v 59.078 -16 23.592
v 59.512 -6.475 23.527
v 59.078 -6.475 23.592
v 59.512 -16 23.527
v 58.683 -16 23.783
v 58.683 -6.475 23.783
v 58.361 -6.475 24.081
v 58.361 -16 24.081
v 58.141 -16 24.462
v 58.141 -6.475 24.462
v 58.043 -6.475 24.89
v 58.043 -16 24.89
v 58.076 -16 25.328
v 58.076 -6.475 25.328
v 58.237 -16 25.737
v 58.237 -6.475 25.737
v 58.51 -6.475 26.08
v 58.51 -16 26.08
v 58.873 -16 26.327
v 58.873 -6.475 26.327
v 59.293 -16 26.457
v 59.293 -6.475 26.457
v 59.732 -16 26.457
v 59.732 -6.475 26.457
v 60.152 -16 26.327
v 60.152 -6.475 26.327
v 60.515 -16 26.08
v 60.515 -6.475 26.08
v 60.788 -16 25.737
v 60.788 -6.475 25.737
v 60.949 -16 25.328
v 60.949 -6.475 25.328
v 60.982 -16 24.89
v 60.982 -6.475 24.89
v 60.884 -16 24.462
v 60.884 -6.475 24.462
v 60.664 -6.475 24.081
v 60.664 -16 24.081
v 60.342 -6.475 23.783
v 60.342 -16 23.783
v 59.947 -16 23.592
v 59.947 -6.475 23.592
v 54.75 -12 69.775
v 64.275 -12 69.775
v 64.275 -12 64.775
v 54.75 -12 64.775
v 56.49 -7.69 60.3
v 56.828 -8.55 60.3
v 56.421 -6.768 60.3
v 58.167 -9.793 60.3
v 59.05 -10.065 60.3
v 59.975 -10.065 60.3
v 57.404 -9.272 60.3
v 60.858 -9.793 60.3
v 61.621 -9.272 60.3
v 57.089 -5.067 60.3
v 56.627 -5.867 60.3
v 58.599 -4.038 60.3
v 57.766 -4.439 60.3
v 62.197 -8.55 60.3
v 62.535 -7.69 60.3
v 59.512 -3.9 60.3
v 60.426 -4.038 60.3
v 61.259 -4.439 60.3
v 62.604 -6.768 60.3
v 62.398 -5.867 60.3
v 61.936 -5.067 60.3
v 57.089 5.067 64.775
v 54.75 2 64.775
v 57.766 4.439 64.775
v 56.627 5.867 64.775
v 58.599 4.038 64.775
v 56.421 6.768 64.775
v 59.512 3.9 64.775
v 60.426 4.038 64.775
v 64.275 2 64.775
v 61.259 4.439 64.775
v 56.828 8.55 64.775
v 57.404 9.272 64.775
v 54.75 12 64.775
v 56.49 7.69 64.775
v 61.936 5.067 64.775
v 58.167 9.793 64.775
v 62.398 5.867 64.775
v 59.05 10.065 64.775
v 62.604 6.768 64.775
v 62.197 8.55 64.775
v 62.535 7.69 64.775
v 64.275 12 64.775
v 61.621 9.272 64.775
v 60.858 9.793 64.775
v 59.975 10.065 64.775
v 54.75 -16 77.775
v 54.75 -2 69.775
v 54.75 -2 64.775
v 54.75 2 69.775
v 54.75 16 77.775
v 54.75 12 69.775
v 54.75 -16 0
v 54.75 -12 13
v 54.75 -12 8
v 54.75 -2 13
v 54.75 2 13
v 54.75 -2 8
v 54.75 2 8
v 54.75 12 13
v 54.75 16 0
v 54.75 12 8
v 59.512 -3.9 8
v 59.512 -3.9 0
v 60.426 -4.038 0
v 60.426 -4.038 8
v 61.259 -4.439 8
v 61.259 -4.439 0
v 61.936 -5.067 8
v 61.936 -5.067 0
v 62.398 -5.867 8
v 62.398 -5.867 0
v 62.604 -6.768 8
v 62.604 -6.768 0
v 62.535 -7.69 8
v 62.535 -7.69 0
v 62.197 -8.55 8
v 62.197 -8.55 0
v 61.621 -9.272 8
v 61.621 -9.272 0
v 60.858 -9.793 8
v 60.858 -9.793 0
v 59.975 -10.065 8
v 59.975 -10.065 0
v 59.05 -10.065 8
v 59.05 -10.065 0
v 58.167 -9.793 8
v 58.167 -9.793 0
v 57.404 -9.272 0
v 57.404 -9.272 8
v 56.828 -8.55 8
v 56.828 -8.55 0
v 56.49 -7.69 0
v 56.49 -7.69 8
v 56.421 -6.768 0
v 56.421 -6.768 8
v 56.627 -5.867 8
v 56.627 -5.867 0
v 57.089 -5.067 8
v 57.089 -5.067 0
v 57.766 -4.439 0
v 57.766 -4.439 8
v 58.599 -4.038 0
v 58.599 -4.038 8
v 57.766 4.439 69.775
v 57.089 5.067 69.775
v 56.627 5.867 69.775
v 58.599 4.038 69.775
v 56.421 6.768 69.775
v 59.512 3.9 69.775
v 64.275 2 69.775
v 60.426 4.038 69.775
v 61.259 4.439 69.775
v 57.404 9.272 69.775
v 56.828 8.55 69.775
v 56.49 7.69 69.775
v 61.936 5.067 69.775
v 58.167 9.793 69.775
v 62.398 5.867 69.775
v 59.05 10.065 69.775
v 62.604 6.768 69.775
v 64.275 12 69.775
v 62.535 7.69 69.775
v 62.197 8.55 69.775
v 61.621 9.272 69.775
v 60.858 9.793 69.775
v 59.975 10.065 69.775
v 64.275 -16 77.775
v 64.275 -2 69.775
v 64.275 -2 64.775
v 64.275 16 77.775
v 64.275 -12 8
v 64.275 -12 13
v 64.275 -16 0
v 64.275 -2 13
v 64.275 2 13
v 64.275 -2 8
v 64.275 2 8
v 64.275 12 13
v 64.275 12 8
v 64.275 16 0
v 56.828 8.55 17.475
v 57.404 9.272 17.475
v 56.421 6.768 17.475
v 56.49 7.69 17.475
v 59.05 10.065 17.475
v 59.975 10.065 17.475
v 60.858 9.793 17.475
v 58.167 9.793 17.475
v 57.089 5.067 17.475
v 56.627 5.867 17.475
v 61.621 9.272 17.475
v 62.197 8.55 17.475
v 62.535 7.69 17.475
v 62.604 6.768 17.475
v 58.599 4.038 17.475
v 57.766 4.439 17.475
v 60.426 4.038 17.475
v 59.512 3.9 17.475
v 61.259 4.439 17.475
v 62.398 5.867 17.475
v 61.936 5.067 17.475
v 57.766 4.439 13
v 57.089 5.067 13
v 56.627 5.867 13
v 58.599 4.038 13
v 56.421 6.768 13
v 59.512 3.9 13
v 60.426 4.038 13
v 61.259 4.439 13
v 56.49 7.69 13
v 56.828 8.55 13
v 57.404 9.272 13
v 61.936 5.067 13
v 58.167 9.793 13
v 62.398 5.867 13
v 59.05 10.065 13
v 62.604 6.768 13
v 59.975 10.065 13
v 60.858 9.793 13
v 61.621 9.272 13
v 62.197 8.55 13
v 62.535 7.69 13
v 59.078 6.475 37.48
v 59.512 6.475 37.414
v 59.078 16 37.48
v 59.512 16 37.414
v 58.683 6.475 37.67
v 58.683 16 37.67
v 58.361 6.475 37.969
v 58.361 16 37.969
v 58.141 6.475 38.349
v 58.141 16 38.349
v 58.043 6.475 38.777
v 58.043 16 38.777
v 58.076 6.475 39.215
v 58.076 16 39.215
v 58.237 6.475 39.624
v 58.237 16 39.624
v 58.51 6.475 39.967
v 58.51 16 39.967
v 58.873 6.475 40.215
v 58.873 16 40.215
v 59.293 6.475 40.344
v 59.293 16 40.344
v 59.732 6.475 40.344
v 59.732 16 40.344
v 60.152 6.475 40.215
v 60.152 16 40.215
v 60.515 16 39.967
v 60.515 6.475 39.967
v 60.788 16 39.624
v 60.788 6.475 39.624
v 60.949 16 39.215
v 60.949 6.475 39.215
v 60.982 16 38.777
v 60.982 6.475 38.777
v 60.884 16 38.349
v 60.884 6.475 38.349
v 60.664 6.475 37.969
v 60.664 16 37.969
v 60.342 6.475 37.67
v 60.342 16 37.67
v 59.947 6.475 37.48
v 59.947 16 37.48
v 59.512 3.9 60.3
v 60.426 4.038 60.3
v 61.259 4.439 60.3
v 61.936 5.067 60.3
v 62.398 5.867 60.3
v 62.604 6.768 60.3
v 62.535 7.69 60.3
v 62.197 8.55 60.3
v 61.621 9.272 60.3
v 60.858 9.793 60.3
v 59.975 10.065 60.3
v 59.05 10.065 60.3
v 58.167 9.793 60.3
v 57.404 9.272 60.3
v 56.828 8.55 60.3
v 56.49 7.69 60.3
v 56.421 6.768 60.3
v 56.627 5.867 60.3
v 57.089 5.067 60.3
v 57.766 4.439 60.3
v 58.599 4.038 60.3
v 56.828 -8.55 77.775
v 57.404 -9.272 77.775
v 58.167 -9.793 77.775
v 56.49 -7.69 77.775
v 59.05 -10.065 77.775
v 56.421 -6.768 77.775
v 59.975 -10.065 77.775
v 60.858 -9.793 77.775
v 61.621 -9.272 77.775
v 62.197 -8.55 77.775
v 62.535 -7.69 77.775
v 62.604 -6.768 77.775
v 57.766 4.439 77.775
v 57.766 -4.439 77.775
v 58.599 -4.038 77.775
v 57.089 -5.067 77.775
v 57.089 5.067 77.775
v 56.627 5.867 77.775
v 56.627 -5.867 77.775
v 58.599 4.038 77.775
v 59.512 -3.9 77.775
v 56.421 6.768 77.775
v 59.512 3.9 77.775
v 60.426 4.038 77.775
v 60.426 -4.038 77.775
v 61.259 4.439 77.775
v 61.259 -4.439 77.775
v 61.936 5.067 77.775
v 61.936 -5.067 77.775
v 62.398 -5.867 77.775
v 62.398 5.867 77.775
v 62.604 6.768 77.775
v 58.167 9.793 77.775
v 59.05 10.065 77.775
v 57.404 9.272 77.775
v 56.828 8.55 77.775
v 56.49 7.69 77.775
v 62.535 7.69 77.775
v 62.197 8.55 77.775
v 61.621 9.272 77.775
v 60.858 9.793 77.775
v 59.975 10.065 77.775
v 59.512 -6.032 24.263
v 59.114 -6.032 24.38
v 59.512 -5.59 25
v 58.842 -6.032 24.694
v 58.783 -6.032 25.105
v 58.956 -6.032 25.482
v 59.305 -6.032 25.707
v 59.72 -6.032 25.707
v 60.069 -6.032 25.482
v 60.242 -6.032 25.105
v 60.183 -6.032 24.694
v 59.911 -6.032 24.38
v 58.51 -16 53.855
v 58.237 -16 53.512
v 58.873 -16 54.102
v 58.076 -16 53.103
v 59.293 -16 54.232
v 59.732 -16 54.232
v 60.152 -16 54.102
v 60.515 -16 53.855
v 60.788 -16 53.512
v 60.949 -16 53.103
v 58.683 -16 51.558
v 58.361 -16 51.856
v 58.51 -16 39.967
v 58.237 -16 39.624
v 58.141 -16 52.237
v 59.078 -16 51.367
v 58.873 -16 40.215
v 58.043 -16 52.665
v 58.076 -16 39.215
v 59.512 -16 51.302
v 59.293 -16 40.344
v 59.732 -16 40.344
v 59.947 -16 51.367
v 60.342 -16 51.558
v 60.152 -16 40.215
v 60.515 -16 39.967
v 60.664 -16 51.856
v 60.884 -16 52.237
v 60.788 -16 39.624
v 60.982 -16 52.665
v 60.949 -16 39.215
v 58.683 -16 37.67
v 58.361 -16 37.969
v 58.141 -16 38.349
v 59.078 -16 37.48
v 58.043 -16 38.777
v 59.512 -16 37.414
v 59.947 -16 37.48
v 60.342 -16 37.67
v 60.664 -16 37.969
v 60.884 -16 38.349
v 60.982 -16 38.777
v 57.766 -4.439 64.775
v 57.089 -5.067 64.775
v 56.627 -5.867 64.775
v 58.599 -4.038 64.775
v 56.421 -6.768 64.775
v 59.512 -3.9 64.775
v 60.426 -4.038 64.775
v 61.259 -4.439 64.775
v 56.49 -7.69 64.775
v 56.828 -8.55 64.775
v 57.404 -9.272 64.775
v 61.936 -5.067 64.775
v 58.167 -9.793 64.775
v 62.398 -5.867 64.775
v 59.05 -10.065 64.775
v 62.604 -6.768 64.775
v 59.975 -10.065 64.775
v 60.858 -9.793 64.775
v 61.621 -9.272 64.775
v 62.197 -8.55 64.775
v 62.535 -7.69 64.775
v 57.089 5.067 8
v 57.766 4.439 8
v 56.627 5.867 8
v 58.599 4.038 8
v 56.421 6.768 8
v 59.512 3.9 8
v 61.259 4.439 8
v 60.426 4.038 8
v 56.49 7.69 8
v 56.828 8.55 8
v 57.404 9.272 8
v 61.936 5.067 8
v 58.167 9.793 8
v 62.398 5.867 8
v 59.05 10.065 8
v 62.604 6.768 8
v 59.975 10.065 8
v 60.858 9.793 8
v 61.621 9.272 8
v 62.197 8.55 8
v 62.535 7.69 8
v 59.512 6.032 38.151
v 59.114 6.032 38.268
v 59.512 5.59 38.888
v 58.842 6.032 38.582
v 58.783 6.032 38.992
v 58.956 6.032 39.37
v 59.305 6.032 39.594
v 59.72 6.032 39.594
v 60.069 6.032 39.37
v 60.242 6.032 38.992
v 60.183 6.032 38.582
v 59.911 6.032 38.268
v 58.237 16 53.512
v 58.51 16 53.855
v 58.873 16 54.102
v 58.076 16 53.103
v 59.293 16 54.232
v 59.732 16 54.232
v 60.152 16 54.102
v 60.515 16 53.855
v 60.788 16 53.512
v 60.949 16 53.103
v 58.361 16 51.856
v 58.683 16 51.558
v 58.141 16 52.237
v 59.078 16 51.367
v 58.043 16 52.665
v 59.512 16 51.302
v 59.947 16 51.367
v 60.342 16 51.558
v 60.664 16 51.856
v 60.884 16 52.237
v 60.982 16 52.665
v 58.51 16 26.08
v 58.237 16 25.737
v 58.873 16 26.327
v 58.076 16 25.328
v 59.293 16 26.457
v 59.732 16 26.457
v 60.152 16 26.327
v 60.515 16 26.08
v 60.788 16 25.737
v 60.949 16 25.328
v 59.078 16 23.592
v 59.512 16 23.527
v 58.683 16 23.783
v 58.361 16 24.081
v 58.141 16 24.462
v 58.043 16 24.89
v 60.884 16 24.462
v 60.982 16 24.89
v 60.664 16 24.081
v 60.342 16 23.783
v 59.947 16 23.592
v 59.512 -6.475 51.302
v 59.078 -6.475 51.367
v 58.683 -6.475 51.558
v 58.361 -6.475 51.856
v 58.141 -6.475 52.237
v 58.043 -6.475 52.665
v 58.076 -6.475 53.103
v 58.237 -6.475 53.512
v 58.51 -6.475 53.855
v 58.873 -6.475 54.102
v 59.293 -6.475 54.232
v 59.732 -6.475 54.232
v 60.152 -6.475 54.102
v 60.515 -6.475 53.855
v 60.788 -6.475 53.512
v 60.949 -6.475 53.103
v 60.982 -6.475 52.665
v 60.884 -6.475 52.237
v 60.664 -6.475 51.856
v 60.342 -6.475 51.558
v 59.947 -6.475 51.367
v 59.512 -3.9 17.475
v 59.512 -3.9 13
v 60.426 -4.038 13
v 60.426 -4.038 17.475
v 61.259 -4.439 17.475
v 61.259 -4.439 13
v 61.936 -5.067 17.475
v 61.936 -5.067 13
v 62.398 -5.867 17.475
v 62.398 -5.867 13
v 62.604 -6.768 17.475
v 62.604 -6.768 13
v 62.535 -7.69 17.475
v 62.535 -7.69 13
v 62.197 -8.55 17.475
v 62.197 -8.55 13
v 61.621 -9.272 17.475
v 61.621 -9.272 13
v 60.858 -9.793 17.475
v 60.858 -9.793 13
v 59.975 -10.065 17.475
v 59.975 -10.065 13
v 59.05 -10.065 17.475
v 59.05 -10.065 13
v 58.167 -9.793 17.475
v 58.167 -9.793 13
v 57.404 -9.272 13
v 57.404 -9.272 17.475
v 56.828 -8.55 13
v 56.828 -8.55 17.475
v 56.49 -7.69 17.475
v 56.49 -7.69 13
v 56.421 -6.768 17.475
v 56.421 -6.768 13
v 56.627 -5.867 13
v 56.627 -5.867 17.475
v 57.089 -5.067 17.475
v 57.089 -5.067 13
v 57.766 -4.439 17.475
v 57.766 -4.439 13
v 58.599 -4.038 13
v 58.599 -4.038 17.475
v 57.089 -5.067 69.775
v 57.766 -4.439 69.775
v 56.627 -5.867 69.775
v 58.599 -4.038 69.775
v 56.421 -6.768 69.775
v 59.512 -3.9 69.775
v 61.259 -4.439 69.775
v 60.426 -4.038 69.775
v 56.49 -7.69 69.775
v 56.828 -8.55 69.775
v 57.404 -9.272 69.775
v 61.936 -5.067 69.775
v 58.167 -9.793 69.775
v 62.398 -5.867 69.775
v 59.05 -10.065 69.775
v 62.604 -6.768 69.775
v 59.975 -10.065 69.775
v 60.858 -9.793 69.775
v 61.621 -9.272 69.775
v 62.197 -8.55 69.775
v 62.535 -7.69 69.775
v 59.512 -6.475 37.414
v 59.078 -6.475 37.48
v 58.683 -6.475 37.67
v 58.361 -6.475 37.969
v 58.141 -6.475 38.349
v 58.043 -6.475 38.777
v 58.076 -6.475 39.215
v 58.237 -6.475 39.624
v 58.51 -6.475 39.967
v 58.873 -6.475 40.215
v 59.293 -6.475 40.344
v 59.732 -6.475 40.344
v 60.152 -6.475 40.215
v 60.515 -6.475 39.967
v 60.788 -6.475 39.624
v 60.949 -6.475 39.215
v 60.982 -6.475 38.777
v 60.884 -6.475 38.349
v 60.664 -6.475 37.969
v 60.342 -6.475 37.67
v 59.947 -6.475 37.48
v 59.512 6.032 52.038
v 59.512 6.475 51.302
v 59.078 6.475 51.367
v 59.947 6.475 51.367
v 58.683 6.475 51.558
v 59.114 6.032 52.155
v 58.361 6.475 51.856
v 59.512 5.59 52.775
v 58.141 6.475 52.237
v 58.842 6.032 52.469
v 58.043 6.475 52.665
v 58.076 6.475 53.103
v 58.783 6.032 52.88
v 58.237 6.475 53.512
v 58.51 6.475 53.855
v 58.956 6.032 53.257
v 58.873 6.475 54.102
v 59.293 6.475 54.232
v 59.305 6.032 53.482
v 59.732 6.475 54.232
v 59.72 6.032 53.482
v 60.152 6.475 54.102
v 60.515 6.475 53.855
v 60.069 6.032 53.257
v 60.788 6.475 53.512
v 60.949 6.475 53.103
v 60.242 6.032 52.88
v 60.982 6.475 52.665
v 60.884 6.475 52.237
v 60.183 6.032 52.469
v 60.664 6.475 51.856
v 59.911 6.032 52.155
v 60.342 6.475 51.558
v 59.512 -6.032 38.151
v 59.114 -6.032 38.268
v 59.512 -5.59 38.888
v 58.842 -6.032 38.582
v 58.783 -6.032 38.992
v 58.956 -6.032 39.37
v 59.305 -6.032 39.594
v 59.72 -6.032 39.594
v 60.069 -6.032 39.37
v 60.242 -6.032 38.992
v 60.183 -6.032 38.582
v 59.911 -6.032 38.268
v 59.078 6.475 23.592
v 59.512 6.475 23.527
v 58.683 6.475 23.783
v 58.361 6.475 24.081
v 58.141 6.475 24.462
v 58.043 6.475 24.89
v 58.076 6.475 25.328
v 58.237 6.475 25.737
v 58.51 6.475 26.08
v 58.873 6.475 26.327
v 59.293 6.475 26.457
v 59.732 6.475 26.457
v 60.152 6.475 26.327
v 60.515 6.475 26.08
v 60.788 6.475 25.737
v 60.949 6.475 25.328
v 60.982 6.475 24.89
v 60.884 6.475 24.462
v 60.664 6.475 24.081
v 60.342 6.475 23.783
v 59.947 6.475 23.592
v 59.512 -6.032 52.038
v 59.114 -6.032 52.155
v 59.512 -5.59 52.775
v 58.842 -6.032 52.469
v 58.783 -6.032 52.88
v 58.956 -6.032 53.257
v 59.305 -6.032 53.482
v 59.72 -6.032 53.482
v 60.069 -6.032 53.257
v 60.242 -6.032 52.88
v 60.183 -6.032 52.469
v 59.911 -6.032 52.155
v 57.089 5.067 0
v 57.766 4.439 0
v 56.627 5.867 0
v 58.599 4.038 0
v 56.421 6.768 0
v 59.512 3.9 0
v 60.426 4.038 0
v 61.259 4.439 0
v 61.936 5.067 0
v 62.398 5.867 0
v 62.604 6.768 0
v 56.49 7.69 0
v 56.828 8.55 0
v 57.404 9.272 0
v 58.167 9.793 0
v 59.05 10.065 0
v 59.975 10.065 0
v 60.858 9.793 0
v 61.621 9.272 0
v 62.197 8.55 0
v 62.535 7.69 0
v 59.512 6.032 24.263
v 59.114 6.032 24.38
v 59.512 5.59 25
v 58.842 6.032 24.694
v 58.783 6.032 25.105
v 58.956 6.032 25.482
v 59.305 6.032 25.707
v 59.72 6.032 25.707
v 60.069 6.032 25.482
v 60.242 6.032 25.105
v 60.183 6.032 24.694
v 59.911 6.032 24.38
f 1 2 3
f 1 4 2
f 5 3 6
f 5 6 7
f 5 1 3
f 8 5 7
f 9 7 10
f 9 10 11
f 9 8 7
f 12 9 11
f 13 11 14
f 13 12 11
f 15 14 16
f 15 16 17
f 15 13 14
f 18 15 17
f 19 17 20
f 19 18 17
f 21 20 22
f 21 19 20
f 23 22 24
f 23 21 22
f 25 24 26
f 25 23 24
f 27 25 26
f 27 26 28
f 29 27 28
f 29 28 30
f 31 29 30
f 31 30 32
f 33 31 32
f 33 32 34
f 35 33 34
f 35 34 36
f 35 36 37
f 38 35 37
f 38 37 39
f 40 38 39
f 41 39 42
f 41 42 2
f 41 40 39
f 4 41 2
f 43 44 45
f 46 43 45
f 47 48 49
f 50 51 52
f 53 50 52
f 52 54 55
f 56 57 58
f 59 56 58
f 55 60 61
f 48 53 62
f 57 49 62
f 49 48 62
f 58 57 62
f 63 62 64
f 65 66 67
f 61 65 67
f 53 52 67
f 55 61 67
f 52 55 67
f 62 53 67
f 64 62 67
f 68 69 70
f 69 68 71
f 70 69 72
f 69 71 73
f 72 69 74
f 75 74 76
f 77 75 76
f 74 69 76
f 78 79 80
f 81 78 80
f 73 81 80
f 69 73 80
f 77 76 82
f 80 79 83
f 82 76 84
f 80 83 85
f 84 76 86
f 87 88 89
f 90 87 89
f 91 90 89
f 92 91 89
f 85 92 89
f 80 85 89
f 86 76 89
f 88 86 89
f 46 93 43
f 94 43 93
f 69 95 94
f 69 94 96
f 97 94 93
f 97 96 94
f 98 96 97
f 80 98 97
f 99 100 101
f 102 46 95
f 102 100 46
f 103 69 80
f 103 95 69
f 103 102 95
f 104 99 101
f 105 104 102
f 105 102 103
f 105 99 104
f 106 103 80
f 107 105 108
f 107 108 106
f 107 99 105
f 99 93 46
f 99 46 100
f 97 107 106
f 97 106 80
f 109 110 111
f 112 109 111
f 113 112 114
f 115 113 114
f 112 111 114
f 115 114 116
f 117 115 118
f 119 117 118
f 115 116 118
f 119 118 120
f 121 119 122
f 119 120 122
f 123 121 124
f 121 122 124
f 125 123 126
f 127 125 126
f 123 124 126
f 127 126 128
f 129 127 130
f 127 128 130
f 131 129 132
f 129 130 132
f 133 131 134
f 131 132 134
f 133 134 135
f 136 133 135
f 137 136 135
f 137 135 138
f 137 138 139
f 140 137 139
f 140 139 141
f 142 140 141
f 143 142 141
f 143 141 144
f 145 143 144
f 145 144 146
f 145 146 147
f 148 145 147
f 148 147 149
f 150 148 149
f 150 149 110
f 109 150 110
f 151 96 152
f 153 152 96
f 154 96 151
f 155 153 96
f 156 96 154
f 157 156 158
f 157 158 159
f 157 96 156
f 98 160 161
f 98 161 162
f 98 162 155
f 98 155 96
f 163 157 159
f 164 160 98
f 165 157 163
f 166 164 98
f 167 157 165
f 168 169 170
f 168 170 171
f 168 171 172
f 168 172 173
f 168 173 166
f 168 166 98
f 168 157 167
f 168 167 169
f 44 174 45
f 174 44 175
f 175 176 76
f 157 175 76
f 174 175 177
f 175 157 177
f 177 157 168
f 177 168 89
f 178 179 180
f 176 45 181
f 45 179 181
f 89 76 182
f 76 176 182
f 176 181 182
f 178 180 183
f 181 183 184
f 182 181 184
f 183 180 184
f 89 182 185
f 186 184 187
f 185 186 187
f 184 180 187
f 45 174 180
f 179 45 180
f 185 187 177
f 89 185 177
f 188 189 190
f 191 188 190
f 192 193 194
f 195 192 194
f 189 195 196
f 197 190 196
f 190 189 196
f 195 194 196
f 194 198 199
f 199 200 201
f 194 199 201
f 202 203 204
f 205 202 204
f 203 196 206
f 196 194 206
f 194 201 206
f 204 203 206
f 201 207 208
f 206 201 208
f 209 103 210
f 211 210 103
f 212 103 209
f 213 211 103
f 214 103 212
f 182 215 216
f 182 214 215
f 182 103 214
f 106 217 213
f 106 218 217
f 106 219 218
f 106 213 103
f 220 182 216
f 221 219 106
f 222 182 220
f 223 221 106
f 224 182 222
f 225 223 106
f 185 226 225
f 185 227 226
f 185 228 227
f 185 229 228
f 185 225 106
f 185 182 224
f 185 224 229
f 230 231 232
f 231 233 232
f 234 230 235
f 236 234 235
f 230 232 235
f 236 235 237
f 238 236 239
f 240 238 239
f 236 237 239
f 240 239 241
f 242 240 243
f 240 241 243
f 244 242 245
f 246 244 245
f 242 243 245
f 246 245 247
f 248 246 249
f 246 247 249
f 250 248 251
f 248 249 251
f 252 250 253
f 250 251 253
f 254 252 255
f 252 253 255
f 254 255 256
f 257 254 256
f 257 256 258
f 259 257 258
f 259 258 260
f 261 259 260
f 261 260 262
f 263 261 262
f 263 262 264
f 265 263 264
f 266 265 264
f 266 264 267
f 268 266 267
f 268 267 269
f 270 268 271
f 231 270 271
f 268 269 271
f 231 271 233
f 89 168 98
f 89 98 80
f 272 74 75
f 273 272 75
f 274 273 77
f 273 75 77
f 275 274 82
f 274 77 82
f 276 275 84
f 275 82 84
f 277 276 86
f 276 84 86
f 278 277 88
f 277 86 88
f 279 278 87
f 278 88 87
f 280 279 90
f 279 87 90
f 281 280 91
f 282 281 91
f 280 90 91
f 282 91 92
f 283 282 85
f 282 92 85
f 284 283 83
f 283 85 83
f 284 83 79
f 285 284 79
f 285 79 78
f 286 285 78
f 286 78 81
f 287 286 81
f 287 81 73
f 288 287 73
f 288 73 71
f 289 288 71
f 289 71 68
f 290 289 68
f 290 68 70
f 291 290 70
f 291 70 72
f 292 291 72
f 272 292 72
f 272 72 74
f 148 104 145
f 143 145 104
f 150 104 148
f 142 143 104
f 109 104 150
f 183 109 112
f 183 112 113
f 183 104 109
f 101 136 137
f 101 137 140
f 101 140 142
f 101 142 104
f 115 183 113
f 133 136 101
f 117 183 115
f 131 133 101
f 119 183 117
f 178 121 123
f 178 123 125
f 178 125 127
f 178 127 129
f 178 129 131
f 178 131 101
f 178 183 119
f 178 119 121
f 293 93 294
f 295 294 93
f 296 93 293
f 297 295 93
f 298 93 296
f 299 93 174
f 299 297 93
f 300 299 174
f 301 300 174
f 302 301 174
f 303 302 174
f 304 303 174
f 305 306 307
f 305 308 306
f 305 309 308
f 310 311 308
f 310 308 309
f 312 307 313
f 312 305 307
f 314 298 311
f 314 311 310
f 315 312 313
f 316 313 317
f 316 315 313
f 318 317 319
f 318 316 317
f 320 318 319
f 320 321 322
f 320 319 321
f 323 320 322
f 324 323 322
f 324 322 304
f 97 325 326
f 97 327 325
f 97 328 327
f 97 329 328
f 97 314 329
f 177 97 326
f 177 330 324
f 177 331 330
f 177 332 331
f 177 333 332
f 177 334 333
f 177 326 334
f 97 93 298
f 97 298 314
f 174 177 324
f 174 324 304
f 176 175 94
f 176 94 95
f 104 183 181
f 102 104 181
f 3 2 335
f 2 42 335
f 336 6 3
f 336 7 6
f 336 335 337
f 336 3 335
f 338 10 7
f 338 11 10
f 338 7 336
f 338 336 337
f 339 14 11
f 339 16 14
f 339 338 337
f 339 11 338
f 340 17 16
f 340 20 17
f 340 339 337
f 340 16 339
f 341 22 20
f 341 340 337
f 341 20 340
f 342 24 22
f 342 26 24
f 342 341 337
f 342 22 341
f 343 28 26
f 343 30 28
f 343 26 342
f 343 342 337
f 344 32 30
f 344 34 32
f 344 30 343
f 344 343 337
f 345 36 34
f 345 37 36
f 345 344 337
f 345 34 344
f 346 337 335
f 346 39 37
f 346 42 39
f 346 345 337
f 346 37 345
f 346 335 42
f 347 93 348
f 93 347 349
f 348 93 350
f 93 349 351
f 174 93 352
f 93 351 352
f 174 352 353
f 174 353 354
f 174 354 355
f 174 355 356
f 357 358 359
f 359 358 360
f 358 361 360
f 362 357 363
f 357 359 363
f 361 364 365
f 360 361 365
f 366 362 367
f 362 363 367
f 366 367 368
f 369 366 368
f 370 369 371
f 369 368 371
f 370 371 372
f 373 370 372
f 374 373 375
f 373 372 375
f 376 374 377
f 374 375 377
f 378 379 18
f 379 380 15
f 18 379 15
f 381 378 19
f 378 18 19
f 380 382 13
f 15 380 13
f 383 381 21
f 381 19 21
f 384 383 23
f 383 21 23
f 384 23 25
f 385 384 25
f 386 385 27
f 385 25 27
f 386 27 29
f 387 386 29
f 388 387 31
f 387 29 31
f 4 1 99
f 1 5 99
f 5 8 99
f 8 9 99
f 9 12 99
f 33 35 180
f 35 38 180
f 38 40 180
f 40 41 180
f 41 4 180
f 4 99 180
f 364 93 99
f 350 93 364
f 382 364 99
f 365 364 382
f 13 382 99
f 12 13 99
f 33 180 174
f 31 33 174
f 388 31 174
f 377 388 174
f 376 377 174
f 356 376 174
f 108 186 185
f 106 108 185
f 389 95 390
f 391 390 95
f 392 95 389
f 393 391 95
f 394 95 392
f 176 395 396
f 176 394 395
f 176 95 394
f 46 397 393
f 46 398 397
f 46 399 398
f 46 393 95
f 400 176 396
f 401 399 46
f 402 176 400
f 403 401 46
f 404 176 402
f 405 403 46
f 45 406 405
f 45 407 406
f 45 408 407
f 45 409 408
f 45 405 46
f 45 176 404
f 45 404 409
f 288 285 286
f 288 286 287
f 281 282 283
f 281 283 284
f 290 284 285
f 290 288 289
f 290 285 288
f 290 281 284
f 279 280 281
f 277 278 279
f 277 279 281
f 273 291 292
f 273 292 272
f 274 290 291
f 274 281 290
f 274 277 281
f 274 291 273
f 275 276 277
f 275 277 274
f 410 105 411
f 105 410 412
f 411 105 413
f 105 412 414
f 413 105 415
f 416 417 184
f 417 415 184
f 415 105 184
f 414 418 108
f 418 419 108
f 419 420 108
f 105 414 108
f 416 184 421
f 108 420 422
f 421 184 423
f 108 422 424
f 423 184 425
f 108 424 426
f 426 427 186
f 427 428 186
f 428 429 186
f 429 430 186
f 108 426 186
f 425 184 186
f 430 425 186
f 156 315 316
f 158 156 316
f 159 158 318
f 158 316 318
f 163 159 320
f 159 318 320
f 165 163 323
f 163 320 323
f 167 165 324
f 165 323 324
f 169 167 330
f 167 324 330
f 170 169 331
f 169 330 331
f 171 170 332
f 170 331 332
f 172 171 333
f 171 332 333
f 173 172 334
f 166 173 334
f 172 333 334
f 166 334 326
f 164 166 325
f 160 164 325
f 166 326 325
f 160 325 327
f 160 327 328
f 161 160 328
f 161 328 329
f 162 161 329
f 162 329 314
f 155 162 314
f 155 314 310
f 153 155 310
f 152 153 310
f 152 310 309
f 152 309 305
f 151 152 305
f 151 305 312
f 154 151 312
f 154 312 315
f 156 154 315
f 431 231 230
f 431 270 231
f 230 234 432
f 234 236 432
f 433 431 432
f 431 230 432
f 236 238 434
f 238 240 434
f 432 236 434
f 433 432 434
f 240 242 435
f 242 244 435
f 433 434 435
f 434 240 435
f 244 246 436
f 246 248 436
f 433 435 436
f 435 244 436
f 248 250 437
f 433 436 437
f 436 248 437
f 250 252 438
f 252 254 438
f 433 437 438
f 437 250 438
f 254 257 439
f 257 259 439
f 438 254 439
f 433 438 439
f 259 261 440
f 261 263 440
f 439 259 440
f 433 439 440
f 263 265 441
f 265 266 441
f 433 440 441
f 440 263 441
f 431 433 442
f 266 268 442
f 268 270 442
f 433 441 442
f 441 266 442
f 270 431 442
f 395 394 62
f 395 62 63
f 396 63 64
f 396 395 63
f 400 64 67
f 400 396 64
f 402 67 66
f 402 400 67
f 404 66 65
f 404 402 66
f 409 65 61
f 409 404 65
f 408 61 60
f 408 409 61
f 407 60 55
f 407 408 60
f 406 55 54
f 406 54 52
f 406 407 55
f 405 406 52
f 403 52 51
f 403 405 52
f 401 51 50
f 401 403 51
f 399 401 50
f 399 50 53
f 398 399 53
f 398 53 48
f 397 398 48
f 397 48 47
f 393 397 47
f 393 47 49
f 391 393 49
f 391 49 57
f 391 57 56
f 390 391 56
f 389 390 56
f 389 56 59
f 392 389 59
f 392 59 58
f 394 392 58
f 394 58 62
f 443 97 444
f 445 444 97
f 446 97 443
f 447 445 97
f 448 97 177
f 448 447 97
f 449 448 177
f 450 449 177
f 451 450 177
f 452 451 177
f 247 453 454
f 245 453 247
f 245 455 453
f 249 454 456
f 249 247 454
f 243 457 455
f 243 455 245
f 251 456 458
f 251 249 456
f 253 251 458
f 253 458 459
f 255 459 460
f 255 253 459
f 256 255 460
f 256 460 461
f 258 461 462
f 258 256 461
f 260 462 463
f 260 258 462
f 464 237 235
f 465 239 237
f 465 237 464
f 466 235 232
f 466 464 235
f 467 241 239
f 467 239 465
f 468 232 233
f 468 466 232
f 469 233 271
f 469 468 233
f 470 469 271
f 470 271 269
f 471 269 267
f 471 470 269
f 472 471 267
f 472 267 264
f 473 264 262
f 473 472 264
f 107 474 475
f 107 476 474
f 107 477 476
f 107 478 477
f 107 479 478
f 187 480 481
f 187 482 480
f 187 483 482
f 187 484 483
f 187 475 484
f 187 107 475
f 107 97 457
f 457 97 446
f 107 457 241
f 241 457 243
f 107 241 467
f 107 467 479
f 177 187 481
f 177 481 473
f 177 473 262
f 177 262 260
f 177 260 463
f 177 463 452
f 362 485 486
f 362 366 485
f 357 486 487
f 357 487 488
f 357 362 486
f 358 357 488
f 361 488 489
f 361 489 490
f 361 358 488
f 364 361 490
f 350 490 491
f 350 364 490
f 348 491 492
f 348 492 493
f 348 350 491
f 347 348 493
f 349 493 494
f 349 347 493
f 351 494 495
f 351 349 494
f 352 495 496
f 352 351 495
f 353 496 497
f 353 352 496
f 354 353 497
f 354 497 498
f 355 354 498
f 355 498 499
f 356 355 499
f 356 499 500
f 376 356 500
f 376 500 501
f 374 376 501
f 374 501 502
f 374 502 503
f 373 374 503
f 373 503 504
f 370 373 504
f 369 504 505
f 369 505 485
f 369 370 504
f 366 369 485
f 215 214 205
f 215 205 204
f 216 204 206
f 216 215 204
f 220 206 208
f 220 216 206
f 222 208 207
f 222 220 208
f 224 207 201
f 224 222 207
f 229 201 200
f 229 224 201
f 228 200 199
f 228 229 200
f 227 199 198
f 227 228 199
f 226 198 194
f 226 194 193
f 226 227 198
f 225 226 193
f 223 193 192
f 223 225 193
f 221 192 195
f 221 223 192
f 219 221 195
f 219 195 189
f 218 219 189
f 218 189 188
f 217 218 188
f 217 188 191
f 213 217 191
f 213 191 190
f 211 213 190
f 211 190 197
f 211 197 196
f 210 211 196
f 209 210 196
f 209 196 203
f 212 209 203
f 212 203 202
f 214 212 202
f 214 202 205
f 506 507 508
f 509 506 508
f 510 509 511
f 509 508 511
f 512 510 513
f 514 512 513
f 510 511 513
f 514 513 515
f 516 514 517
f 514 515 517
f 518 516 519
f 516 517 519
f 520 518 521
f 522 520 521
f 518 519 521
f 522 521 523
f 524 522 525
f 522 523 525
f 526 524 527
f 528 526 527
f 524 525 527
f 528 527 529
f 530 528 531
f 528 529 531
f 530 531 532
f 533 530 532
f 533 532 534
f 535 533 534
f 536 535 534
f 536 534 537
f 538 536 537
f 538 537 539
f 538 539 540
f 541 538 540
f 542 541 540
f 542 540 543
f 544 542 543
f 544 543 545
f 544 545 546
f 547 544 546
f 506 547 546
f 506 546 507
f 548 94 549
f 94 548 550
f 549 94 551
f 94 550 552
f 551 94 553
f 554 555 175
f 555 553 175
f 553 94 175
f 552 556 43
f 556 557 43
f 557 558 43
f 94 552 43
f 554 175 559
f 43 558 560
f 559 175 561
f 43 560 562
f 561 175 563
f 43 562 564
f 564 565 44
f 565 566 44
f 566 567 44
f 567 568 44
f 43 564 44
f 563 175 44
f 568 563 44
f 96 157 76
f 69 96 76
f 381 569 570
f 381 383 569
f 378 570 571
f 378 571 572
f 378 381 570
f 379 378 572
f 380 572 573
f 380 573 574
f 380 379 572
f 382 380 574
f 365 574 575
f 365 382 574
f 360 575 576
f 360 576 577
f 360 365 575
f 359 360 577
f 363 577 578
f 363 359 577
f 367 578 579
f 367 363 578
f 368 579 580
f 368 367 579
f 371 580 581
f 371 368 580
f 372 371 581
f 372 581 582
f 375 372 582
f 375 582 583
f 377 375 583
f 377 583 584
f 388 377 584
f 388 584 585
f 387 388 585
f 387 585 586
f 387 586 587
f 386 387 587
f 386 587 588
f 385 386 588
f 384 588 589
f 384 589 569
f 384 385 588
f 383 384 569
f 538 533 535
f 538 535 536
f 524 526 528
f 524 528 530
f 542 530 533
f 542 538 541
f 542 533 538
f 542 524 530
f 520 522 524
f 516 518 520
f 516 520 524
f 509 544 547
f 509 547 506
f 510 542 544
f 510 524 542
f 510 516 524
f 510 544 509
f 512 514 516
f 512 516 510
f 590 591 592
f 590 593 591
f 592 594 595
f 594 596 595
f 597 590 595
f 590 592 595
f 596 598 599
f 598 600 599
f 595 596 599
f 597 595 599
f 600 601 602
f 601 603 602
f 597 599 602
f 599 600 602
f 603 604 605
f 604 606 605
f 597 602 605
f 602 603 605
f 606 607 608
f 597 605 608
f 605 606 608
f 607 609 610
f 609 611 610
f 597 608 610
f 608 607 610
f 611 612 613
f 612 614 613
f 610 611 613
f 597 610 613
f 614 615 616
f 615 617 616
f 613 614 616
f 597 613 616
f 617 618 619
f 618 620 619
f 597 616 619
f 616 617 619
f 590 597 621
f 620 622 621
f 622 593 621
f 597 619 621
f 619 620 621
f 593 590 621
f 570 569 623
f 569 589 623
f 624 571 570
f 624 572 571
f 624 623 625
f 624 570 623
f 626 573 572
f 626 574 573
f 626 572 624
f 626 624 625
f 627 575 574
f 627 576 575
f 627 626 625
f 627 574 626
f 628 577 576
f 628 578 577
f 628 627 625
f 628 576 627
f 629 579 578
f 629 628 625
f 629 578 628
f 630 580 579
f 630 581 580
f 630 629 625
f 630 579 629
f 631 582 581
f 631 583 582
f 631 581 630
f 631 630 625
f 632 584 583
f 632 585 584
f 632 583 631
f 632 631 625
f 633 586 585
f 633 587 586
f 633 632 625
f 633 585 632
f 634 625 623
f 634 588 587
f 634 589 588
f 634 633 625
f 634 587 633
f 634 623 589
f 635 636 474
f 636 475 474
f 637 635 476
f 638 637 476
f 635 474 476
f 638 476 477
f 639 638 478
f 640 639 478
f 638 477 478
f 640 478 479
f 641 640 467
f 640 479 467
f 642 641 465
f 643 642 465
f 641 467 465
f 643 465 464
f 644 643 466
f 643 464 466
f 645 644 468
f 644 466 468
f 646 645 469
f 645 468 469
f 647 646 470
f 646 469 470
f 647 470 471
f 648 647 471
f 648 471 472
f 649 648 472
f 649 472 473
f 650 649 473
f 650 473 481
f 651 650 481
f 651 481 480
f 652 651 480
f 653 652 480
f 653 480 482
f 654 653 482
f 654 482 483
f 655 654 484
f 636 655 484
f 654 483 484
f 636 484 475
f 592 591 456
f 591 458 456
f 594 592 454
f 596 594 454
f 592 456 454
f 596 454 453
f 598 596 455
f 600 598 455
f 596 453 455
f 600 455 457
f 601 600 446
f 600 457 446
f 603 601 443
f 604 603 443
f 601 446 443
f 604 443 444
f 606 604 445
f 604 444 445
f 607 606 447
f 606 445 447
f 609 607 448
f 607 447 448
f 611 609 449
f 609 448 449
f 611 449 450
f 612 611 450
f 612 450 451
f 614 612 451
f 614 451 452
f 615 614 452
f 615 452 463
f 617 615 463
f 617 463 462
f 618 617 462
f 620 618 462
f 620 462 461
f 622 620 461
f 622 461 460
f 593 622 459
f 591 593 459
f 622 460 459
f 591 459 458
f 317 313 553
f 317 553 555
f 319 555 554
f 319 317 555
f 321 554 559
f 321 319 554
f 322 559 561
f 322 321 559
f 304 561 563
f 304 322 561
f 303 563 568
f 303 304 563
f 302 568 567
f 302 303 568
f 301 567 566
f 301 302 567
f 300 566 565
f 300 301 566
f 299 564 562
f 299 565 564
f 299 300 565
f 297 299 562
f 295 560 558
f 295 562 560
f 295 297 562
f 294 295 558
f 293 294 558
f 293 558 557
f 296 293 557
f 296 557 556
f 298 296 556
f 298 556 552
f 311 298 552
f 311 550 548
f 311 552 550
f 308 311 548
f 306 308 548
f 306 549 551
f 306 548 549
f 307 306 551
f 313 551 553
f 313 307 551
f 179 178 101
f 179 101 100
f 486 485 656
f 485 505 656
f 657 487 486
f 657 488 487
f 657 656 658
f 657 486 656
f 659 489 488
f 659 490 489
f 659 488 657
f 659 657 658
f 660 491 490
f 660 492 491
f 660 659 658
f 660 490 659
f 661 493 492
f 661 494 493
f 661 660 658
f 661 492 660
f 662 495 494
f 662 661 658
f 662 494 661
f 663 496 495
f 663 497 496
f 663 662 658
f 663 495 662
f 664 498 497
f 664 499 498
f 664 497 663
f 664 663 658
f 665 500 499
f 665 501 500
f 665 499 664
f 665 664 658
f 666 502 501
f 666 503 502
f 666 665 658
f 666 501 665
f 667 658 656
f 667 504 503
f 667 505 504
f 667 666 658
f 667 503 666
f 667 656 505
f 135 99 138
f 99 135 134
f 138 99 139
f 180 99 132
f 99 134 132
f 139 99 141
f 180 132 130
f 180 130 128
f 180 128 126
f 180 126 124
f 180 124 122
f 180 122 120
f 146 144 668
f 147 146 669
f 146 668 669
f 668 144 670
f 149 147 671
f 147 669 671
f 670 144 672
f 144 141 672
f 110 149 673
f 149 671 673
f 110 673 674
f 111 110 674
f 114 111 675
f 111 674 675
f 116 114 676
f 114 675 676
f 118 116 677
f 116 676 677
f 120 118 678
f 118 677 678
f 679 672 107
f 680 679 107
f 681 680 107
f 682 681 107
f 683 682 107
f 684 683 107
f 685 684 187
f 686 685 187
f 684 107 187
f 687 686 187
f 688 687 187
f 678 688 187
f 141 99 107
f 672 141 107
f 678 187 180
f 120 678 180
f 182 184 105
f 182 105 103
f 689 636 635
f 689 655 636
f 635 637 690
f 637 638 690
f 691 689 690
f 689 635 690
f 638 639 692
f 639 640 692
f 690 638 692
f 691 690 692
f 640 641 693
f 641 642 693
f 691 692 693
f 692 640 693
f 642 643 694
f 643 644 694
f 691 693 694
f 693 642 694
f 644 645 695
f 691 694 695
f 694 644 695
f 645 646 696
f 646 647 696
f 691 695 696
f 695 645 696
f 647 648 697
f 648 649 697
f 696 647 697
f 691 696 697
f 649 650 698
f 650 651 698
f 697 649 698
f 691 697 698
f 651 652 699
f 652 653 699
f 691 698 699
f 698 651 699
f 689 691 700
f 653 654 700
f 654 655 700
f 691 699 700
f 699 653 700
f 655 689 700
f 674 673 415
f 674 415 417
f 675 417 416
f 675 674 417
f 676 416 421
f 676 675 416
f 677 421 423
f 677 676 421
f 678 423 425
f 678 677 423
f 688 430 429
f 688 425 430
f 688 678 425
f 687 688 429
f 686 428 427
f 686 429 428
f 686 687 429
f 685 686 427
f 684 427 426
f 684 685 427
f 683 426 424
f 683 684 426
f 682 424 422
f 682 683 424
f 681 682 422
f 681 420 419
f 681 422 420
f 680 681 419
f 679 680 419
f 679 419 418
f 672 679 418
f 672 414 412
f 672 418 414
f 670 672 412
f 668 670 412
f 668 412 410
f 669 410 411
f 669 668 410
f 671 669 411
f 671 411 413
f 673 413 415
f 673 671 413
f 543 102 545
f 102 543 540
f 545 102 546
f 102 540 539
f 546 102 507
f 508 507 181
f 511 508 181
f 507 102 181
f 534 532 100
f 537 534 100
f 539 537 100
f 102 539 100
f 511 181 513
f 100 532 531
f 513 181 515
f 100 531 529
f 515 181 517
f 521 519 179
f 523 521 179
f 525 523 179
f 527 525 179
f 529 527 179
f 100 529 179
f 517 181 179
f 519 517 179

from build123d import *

# Parameters (mm, degrees)
SKETCH1_W               = 9.525
SKETCH1_H               = 32
BOSS_EXTRUDE1_DEPTH     = 77.775
SKETCH2_W               = 5
SKETCH2_H               = 10
NUT_SLOT_DEPTH          = 80.972971997
M6_START                = 9.525
SKETCH3_R               = 3.1
M6_DRILL_DEPTH          = 27
MIRROR2_COPY_1_SKETCH_W = 5
MIRROR2_COPY_1_SKETCH_H = 10
MIRROR2_COPY_1_DEPTH    = 80.972971997
MIRROR2_START           = 9.525
MIRROR2_COPY_2_SKETCH_R = 3.1
MIRROR2_COPY_2_DEPTH    = 27
LPATTERN1_COUNT         = 3
LPATTERN1_PITCH         = 13.8875


with BuildPart() as part:
    # Sketch1 → Boss-Extrude1 (new body)
    with BuildSketch(Plane.XY):
        with Locations((59.5125, 0)):
            Rectangle(SKETCH1_W, SKETCH1_H)
    extrude(amount=BOSS_EXTRUDE1_DEPTH)

    # Sketch2 → Nut Slot (cut, through all)
    with BuildSketch(Plane(origin=(64.275, 0, 0), x_dir=(0, 0, -1), z_dir=(1, 0, 0))):
        with Locations((-67.275, 7)):
            Rectangle(SKETCH2_W, SKETCH2_H)
    nut_slot = extrude(amount=-NUT_SLOT_DEPTH, mode=Mode.SUBTRACT)

    # Sketch3 → M6 Drill (cut)
    with BuildSketch(Plane.XY.offset(77.775).offset(M6_START)):
        with Locations(Location((59.5125, 7, 0), (0, 0, 270))):
            Circle(SKETCH3_R)
    m6_drill = extrude(amount=-M6_DRILL_DEPTH, mode=Mode.SUBTRACT)

    # Mirror1: Nut Slot, M6 Drill across plane
    add(nut_slot.mirror(Plane.ZX), mode=Mode.SUBTRACT)
    add(m6_drill.mirror(Plane.ZX), mode=Mode.SUBTRACT)

    # Mirror2: Nut Slot, M6 Drill across plane
    add(nut_slot.mirror(Plane.XY.offset(38.8875)), mode=Mode.SUBTRACT)
    add(m6_drill.mirror(Plane.XY.offset(38.8875)), mode=Mode.SUBTRACT)

    # Mirror2 copy 1 sketch → Mirror2 copy 1 (cut, through all)
    with BuildSketch(Plane(origin=(64.275, 0, 77.775), x_dir=(0, 0, 1), z_dir=(1, 0, 0))):
        with Locations((-67.275, 7)):
            Rectangle(MIRROR2_COPY_1_SKETCH_W, MIRROR2_COPY_1_SKETCH_H)
    extrude(amount=-MIRROR2_COPY_1_DEPTH, mode=Mode.SUBTRACT)

    # Mirror2 copy 2 sketch → Mirror2 copy 2 (cut)
    with BuildSketch(Plane(origin=(0, 0, 0), x_dir=(1, 0, 0), z_dir=(0, 0, -1)).offset(MIRROR2_START)):
        with Locations(Location((59.5125, 7, 0), (0, 0, 270))):
            Circle(MIRROR2_COPY_2_SKETCH_R)
    extrude(amount=-MIRROR2_COPY_2_DEPTH, mode=Mode.SUBTRACT)

    # Sketch7 → #32 (0.116) Diameter Hole1 (revolve, cut)
    with BuildSketch(Plane(origin=(59.5125, -16, 52.775), x_dir=(0, 0, -1), z_dir=(1, 0, 0))):
        Polygon((0, 0), (0, 10.410187864), (1.4732, 9.525), (1.4732, 0), align=None)
    f_32_0_116_diameter_hole1 = revolve(axis=Axis((59.5125, -22.35, 52.775), (0, 1, 0)), mode=Mode.SUBTRACT)

    # LPattern1: #32 (0.116) Diameter Hole1 ×3
    with Locations(*[(0, 0, -i * LPATTERN1_PITCH) for i in range(1, LPATTERN1_COUNT)]):
        add(f_32_0_116_diameter_hole1, mode=Mode.SUBTRACT)

    # Mirror3: #32 (0.116) Diameter Hole1 across plane
    add(f_32_0_116_diameter_hole1.mirror(Plane.ZX), mode=Mode.SUBTRACT)

    # Mirror3 copy 1 sketch → Mirror3 copy 1 (revolve, cut)
    with BuildSketch(Plane(origin=(59.5125, 16, 38.8875), x_dir=(0, 0, -1), z_dir=(1, 0, 0))):
        Polygon((0, 0), (0, -10.410187864), (1.4732, -9.525), (1.4732, 0), align=None)
    revolve(axis=Axis((59.5125, 22.35, 38.8875), (0, 1, 0)), mode=Mode.SUBTRACT)

    # Mirror3 copy 2 sketch → Mirror3 copy 2 (revolve, cut)
    with BuildSketch(Plane(origin=(59.5125, 16, 25), x_dir=(0, 0, -1), z_dir=(1, 0, 0))):
        Polygon((0, 0), (0, -10.410187864), (1.4732, -9.525), (1.4732, 0), align=None)
    revolve(axis=Axis((59.5125, 22.35, 25), (0, 1, 0)), mode=Mode.SUBTRACT)


solid = part.part
